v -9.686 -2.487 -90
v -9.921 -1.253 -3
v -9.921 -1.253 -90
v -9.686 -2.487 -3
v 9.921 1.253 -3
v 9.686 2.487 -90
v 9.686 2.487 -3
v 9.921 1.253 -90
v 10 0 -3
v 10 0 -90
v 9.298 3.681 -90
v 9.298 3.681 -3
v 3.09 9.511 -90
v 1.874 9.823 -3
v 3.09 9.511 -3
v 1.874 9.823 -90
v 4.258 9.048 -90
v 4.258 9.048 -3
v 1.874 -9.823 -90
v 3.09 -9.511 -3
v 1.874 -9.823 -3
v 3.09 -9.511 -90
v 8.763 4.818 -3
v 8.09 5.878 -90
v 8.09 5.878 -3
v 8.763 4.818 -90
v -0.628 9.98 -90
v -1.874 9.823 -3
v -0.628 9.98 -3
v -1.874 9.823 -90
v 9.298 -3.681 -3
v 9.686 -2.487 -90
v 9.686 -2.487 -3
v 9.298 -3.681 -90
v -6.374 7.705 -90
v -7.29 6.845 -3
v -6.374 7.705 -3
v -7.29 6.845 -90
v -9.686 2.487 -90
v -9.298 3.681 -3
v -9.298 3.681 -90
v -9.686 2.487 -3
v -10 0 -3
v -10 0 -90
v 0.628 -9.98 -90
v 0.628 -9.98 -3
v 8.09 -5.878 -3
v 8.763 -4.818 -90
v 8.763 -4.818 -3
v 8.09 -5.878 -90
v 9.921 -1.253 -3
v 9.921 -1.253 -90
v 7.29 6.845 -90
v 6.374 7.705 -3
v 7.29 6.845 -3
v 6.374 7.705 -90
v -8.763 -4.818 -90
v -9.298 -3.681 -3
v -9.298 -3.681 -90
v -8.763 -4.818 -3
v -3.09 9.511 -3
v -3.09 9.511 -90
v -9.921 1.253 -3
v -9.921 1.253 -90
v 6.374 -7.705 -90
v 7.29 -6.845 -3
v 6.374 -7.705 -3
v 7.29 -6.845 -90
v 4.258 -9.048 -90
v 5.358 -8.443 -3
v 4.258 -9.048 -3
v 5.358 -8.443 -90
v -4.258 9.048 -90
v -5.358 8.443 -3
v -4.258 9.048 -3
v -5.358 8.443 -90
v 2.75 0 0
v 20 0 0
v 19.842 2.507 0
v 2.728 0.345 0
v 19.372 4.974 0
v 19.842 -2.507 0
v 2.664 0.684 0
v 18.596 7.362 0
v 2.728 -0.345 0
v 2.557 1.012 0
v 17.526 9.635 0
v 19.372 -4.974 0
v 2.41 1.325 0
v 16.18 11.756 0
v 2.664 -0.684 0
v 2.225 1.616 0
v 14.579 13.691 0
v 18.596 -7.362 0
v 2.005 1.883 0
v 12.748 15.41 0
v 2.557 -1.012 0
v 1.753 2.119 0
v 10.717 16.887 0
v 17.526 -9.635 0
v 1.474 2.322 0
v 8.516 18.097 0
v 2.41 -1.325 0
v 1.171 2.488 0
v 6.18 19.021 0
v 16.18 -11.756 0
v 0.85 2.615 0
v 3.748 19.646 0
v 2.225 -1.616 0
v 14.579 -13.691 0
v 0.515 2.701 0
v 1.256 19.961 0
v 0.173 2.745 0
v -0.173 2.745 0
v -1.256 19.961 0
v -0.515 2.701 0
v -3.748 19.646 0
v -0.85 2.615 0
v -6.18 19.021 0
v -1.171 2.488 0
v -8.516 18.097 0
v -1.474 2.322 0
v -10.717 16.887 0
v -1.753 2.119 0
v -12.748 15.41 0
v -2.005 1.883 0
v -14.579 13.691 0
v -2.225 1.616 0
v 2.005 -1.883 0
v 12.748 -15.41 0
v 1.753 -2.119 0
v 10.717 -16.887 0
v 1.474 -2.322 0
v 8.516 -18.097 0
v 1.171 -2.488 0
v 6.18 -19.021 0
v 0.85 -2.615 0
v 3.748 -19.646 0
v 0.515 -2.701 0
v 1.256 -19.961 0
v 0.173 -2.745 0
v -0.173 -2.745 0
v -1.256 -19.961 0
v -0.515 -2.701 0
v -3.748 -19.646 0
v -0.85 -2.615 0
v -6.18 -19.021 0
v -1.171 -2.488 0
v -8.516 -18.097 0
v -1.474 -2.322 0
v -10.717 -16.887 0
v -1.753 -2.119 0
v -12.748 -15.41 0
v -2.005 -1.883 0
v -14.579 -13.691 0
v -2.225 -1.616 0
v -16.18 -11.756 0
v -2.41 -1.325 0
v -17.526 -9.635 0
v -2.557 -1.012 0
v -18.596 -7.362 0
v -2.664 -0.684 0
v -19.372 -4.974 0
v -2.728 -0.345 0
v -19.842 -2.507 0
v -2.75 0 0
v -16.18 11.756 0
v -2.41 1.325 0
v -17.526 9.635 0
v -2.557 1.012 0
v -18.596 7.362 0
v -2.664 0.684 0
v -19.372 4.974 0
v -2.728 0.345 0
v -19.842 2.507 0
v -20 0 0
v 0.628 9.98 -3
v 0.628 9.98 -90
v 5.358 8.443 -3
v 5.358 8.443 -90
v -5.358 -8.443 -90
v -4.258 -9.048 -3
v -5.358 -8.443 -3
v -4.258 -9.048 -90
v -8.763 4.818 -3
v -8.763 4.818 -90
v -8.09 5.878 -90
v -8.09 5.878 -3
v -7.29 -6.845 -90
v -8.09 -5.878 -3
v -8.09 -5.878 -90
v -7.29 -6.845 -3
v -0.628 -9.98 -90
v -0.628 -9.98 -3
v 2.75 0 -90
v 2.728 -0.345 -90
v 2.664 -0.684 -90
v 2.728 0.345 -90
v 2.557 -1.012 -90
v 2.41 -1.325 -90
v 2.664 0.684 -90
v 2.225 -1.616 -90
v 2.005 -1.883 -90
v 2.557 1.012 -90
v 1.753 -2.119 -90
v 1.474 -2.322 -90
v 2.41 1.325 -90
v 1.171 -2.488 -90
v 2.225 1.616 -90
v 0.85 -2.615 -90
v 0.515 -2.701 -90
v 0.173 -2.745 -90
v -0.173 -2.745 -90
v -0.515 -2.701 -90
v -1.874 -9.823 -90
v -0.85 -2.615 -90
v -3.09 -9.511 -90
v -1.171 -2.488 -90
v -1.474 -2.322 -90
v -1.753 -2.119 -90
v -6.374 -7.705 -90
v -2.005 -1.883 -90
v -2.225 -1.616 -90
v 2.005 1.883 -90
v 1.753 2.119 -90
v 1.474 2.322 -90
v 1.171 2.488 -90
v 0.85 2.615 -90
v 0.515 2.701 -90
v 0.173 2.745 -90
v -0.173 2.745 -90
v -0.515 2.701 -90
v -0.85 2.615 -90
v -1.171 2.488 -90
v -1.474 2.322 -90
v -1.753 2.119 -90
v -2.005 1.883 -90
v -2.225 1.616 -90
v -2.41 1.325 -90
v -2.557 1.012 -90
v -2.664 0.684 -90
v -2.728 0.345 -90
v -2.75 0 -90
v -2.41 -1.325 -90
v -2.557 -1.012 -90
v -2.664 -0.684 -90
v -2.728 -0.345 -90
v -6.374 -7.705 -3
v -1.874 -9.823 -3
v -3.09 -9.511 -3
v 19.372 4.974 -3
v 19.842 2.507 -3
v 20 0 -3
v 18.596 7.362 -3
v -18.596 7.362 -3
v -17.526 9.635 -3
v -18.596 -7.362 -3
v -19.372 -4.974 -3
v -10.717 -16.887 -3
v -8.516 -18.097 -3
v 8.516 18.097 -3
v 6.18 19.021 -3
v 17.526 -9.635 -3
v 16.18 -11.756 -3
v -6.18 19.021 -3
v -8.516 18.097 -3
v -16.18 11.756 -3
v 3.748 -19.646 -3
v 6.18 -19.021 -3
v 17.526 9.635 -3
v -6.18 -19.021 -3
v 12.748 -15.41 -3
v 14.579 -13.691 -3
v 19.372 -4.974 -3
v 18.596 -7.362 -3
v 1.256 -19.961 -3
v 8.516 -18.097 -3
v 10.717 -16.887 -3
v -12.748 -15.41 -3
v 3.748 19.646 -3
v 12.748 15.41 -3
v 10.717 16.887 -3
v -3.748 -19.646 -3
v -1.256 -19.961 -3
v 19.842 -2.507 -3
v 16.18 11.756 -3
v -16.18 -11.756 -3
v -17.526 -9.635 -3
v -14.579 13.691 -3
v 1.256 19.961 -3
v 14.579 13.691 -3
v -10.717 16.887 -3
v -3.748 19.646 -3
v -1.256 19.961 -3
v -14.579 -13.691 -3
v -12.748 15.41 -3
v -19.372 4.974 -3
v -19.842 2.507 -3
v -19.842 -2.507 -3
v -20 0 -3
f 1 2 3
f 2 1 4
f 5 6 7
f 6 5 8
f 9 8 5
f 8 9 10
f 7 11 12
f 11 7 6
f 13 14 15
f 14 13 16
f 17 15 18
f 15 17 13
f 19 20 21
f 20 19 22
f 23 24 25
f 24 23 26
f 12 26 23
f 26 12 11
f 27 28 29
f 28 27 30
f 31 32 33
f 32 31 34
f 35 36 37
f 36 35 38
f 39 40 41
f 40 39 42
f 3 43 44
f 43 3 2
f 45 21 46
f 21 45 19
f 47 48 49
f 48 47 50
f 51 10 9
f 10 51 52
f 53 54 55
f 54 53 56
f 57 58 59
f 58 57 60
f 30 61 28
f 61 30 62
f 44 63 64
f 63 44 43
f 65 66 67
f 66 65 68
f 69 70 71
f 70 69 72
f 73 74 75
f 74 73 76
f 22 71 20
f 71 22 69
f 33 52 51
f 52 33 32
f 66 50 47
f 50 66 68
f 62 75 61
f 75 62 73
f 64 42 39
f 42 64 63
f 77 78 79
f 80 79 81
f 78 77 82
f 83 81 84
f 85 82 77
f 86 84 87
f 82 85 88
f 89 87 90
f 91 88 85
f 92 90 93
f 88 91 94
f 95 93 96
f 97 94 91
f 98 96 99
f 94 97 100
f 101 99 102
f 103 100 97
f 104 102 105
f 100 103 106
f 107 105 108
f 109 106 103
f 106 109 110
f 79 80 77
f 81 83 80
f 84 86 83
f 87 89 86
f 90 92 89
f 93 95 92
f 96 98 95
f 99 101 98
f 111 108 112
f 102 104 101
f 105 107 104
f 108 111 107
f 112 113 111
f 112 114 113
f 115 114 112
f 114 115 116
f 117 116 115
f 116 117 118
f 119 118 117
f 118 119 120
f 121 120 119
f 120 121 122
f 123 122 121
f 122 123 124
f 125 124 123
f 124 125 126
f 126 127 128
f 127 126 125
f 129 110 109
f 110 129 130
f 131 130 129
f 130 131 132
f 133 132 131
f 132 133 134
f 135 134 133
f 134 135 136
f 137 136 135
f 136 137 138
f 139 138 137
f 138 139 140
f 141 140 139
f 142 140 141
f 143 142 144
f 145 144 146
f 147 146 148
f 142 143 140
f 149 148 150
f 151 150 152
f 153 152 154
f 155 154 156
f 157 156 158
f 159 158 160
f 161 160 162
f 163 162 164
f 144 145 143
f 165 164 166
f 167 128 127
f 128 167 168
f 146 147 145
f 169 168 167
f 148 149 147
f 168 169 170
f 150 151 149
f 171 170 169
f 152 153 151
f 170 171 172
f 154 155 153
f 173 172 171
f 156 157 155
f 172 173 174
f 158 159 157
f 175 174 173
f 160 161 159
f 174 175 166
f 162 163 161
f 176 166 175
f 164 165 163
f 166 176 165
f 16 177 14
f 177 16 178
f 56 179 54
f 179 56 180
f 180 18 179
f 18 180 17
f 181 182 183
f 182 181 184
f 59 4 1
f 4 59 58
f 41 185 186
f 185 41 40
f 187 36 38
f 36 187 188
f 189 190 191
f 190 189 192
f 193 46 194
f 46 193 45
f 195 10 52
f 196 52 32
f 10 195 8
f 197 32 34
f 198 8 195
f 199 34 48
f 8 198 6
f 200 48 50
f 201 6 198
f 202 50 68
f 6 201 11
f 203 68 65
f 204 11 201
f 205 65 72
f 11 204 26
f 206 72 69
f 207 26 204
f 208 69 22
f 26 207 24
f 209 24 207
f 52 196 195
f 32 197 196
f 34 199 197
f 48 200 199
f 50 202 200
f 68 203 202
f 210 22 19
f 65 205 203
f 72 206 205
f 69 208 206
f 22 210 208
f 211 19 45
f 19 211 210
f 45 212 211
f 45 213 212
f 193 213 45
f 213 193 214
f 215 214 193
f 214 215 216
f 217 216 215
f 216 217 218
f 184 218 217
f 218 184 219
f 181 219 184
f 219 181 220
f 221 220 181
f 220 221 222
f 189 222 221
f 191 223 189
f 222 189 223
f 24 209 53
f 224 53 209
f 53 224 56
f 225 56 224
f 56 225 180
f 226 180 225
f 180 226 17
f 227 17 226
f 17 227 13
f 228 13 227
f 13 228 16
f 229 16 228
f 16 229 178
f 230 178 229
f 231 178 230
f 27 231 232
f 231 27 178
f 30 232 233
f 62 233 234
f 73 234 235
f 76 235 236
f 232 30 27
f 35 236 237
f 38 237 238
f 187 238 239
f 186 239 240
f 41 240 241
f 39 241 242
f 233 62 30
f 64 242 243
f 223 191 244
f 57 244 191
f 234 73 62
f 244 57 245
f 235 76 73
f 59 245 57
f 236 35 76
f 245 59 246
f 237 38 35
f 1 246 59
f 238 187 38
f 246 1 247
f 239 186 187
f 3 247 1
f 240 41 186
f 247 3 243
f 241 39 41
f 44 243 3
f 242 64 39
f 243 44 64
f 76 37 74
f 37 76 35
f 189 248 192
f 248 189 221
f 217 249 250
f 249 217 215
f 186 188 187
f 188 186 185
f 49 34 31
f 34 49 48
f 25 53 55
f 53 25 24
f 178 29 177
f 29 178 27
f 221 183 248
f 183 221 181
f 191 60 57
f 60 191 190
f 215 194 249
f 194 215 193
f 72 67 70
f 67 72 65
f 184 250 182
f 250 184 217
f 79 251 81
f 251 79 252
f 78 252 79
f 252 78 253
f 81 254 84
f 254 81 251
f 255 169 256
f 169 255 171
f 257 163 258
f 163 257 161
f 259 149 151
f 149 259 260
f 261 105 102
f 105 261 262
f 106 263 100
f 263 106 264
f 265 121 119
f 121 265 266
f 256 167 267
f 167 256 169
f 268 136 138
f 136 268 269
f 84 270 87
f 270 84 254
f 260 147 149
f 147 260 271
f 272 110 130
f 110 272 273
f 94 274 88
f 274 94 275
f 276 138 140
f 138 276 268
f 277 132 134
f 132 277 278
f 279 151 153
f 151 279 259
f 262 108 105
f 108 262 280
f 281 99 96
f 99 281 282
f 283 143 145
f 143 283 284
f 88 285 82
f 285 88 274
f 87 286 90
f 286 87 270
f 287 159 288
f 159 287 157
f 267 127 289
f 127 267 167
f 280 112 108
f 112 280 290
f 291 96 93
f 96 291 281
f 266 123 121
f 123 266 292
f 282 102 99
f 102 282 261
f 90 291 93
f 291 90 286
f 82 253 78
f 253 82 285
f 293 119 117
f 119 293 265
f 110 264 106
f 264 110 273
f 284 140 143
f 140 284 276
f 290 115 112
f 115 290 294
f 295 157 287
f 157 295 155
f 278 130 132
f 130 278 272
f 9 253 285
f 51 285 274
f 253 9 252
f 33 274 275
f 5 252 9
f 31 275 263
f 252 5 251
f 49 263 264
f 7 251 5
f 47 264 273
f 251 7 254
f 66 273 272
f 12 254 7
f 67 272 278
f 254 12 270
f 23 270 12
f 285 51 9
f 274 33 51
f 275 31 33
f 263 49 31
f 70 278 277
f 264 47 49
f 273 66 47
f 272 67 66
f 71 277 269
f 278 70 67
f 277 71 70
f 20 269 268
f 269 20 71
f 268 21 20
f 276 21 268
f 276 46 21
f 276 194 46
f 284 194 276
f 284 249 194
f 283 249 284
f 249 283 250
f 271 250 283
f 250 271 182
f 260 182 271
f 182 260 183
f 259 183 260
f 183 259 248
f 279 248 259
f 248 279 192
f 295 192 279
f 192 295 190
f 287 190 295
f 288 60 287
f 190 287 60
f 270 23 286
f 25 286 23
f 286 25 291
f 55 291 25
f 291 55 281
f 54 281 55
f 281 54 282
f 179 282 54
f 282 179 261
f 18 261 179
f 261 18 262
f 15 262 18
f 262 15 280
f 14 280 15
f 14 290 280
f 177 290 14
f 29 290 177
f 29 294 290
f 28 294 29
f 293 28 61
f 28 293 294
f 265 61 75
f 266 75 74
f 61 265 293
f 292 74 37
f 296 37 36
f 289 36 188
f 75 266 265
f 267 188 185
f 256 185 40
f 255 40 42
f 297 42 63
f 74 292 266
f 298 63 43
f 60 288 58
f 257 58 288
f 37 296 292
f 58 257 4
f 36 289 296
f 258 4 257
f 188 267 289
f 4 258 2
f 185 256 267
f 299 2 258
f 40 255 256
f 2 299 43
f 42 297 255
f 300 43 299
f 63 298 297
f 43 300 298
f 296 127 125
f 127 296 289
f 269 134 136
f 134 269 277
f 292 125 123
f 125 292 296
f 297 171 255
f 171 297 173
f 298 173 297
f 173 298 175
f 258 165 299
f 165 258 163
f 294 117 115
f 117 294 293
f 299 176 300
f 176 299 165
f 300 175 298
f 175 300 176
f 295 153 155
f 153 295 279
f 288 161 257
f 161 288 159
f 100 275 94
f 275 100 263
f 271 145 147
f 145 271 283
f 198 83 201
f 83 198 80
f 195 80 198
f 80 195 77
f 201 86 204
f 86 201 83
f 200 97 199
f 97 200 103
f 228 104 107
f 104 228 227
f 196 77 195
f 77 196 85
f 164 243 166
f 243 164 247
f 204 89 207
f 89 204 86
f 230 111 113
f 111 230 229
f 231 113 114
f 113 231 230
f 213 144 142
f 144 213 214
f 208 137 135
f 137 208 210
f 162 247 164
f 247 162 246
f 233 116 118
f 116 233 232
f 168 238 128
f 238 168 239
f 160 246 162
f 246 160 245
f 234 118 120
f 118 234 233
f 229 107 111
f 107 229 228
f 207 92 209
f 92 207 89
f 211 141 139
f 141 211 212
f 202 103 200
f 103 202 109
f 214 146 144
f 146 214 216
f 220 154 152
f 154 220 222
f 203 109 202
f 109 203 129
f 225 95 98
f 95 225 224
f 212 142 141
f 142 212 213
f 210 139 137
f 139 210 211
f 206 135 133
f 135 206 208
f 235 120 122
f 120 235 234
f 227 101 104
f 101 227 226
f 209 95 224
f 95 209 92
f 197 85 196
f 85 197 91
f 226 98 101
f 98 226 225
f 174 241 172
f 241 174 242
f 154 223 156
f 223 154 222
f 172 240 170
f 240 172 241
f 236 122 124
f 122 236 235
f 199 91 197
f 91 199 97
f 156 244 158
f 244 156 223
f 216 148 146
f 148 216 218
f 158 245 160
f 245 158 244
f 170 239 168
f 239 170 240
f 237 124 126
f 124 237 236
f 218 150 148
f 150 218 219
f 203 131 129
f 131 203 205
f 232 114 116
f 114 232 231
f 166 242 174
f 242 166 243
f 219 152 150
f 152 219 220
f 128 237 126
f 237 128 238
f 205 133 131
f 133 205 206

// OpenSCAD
$fn = 50;


difference() {
	union() {
		translate(v = [0, 0, -90.0000000000]) {
			cylinder(h = 90, r = 10.0000000000);
		}
		translate(v = [0, 0, -3.0000000000]) {
			cylinder(h = 3, r = 20.0000000000);
		}
	}
	union() {
		#translate(v = [0, 0, -90]) {
			cylinder(h = 90, r = 2.7500000000);
		}
	}
}
